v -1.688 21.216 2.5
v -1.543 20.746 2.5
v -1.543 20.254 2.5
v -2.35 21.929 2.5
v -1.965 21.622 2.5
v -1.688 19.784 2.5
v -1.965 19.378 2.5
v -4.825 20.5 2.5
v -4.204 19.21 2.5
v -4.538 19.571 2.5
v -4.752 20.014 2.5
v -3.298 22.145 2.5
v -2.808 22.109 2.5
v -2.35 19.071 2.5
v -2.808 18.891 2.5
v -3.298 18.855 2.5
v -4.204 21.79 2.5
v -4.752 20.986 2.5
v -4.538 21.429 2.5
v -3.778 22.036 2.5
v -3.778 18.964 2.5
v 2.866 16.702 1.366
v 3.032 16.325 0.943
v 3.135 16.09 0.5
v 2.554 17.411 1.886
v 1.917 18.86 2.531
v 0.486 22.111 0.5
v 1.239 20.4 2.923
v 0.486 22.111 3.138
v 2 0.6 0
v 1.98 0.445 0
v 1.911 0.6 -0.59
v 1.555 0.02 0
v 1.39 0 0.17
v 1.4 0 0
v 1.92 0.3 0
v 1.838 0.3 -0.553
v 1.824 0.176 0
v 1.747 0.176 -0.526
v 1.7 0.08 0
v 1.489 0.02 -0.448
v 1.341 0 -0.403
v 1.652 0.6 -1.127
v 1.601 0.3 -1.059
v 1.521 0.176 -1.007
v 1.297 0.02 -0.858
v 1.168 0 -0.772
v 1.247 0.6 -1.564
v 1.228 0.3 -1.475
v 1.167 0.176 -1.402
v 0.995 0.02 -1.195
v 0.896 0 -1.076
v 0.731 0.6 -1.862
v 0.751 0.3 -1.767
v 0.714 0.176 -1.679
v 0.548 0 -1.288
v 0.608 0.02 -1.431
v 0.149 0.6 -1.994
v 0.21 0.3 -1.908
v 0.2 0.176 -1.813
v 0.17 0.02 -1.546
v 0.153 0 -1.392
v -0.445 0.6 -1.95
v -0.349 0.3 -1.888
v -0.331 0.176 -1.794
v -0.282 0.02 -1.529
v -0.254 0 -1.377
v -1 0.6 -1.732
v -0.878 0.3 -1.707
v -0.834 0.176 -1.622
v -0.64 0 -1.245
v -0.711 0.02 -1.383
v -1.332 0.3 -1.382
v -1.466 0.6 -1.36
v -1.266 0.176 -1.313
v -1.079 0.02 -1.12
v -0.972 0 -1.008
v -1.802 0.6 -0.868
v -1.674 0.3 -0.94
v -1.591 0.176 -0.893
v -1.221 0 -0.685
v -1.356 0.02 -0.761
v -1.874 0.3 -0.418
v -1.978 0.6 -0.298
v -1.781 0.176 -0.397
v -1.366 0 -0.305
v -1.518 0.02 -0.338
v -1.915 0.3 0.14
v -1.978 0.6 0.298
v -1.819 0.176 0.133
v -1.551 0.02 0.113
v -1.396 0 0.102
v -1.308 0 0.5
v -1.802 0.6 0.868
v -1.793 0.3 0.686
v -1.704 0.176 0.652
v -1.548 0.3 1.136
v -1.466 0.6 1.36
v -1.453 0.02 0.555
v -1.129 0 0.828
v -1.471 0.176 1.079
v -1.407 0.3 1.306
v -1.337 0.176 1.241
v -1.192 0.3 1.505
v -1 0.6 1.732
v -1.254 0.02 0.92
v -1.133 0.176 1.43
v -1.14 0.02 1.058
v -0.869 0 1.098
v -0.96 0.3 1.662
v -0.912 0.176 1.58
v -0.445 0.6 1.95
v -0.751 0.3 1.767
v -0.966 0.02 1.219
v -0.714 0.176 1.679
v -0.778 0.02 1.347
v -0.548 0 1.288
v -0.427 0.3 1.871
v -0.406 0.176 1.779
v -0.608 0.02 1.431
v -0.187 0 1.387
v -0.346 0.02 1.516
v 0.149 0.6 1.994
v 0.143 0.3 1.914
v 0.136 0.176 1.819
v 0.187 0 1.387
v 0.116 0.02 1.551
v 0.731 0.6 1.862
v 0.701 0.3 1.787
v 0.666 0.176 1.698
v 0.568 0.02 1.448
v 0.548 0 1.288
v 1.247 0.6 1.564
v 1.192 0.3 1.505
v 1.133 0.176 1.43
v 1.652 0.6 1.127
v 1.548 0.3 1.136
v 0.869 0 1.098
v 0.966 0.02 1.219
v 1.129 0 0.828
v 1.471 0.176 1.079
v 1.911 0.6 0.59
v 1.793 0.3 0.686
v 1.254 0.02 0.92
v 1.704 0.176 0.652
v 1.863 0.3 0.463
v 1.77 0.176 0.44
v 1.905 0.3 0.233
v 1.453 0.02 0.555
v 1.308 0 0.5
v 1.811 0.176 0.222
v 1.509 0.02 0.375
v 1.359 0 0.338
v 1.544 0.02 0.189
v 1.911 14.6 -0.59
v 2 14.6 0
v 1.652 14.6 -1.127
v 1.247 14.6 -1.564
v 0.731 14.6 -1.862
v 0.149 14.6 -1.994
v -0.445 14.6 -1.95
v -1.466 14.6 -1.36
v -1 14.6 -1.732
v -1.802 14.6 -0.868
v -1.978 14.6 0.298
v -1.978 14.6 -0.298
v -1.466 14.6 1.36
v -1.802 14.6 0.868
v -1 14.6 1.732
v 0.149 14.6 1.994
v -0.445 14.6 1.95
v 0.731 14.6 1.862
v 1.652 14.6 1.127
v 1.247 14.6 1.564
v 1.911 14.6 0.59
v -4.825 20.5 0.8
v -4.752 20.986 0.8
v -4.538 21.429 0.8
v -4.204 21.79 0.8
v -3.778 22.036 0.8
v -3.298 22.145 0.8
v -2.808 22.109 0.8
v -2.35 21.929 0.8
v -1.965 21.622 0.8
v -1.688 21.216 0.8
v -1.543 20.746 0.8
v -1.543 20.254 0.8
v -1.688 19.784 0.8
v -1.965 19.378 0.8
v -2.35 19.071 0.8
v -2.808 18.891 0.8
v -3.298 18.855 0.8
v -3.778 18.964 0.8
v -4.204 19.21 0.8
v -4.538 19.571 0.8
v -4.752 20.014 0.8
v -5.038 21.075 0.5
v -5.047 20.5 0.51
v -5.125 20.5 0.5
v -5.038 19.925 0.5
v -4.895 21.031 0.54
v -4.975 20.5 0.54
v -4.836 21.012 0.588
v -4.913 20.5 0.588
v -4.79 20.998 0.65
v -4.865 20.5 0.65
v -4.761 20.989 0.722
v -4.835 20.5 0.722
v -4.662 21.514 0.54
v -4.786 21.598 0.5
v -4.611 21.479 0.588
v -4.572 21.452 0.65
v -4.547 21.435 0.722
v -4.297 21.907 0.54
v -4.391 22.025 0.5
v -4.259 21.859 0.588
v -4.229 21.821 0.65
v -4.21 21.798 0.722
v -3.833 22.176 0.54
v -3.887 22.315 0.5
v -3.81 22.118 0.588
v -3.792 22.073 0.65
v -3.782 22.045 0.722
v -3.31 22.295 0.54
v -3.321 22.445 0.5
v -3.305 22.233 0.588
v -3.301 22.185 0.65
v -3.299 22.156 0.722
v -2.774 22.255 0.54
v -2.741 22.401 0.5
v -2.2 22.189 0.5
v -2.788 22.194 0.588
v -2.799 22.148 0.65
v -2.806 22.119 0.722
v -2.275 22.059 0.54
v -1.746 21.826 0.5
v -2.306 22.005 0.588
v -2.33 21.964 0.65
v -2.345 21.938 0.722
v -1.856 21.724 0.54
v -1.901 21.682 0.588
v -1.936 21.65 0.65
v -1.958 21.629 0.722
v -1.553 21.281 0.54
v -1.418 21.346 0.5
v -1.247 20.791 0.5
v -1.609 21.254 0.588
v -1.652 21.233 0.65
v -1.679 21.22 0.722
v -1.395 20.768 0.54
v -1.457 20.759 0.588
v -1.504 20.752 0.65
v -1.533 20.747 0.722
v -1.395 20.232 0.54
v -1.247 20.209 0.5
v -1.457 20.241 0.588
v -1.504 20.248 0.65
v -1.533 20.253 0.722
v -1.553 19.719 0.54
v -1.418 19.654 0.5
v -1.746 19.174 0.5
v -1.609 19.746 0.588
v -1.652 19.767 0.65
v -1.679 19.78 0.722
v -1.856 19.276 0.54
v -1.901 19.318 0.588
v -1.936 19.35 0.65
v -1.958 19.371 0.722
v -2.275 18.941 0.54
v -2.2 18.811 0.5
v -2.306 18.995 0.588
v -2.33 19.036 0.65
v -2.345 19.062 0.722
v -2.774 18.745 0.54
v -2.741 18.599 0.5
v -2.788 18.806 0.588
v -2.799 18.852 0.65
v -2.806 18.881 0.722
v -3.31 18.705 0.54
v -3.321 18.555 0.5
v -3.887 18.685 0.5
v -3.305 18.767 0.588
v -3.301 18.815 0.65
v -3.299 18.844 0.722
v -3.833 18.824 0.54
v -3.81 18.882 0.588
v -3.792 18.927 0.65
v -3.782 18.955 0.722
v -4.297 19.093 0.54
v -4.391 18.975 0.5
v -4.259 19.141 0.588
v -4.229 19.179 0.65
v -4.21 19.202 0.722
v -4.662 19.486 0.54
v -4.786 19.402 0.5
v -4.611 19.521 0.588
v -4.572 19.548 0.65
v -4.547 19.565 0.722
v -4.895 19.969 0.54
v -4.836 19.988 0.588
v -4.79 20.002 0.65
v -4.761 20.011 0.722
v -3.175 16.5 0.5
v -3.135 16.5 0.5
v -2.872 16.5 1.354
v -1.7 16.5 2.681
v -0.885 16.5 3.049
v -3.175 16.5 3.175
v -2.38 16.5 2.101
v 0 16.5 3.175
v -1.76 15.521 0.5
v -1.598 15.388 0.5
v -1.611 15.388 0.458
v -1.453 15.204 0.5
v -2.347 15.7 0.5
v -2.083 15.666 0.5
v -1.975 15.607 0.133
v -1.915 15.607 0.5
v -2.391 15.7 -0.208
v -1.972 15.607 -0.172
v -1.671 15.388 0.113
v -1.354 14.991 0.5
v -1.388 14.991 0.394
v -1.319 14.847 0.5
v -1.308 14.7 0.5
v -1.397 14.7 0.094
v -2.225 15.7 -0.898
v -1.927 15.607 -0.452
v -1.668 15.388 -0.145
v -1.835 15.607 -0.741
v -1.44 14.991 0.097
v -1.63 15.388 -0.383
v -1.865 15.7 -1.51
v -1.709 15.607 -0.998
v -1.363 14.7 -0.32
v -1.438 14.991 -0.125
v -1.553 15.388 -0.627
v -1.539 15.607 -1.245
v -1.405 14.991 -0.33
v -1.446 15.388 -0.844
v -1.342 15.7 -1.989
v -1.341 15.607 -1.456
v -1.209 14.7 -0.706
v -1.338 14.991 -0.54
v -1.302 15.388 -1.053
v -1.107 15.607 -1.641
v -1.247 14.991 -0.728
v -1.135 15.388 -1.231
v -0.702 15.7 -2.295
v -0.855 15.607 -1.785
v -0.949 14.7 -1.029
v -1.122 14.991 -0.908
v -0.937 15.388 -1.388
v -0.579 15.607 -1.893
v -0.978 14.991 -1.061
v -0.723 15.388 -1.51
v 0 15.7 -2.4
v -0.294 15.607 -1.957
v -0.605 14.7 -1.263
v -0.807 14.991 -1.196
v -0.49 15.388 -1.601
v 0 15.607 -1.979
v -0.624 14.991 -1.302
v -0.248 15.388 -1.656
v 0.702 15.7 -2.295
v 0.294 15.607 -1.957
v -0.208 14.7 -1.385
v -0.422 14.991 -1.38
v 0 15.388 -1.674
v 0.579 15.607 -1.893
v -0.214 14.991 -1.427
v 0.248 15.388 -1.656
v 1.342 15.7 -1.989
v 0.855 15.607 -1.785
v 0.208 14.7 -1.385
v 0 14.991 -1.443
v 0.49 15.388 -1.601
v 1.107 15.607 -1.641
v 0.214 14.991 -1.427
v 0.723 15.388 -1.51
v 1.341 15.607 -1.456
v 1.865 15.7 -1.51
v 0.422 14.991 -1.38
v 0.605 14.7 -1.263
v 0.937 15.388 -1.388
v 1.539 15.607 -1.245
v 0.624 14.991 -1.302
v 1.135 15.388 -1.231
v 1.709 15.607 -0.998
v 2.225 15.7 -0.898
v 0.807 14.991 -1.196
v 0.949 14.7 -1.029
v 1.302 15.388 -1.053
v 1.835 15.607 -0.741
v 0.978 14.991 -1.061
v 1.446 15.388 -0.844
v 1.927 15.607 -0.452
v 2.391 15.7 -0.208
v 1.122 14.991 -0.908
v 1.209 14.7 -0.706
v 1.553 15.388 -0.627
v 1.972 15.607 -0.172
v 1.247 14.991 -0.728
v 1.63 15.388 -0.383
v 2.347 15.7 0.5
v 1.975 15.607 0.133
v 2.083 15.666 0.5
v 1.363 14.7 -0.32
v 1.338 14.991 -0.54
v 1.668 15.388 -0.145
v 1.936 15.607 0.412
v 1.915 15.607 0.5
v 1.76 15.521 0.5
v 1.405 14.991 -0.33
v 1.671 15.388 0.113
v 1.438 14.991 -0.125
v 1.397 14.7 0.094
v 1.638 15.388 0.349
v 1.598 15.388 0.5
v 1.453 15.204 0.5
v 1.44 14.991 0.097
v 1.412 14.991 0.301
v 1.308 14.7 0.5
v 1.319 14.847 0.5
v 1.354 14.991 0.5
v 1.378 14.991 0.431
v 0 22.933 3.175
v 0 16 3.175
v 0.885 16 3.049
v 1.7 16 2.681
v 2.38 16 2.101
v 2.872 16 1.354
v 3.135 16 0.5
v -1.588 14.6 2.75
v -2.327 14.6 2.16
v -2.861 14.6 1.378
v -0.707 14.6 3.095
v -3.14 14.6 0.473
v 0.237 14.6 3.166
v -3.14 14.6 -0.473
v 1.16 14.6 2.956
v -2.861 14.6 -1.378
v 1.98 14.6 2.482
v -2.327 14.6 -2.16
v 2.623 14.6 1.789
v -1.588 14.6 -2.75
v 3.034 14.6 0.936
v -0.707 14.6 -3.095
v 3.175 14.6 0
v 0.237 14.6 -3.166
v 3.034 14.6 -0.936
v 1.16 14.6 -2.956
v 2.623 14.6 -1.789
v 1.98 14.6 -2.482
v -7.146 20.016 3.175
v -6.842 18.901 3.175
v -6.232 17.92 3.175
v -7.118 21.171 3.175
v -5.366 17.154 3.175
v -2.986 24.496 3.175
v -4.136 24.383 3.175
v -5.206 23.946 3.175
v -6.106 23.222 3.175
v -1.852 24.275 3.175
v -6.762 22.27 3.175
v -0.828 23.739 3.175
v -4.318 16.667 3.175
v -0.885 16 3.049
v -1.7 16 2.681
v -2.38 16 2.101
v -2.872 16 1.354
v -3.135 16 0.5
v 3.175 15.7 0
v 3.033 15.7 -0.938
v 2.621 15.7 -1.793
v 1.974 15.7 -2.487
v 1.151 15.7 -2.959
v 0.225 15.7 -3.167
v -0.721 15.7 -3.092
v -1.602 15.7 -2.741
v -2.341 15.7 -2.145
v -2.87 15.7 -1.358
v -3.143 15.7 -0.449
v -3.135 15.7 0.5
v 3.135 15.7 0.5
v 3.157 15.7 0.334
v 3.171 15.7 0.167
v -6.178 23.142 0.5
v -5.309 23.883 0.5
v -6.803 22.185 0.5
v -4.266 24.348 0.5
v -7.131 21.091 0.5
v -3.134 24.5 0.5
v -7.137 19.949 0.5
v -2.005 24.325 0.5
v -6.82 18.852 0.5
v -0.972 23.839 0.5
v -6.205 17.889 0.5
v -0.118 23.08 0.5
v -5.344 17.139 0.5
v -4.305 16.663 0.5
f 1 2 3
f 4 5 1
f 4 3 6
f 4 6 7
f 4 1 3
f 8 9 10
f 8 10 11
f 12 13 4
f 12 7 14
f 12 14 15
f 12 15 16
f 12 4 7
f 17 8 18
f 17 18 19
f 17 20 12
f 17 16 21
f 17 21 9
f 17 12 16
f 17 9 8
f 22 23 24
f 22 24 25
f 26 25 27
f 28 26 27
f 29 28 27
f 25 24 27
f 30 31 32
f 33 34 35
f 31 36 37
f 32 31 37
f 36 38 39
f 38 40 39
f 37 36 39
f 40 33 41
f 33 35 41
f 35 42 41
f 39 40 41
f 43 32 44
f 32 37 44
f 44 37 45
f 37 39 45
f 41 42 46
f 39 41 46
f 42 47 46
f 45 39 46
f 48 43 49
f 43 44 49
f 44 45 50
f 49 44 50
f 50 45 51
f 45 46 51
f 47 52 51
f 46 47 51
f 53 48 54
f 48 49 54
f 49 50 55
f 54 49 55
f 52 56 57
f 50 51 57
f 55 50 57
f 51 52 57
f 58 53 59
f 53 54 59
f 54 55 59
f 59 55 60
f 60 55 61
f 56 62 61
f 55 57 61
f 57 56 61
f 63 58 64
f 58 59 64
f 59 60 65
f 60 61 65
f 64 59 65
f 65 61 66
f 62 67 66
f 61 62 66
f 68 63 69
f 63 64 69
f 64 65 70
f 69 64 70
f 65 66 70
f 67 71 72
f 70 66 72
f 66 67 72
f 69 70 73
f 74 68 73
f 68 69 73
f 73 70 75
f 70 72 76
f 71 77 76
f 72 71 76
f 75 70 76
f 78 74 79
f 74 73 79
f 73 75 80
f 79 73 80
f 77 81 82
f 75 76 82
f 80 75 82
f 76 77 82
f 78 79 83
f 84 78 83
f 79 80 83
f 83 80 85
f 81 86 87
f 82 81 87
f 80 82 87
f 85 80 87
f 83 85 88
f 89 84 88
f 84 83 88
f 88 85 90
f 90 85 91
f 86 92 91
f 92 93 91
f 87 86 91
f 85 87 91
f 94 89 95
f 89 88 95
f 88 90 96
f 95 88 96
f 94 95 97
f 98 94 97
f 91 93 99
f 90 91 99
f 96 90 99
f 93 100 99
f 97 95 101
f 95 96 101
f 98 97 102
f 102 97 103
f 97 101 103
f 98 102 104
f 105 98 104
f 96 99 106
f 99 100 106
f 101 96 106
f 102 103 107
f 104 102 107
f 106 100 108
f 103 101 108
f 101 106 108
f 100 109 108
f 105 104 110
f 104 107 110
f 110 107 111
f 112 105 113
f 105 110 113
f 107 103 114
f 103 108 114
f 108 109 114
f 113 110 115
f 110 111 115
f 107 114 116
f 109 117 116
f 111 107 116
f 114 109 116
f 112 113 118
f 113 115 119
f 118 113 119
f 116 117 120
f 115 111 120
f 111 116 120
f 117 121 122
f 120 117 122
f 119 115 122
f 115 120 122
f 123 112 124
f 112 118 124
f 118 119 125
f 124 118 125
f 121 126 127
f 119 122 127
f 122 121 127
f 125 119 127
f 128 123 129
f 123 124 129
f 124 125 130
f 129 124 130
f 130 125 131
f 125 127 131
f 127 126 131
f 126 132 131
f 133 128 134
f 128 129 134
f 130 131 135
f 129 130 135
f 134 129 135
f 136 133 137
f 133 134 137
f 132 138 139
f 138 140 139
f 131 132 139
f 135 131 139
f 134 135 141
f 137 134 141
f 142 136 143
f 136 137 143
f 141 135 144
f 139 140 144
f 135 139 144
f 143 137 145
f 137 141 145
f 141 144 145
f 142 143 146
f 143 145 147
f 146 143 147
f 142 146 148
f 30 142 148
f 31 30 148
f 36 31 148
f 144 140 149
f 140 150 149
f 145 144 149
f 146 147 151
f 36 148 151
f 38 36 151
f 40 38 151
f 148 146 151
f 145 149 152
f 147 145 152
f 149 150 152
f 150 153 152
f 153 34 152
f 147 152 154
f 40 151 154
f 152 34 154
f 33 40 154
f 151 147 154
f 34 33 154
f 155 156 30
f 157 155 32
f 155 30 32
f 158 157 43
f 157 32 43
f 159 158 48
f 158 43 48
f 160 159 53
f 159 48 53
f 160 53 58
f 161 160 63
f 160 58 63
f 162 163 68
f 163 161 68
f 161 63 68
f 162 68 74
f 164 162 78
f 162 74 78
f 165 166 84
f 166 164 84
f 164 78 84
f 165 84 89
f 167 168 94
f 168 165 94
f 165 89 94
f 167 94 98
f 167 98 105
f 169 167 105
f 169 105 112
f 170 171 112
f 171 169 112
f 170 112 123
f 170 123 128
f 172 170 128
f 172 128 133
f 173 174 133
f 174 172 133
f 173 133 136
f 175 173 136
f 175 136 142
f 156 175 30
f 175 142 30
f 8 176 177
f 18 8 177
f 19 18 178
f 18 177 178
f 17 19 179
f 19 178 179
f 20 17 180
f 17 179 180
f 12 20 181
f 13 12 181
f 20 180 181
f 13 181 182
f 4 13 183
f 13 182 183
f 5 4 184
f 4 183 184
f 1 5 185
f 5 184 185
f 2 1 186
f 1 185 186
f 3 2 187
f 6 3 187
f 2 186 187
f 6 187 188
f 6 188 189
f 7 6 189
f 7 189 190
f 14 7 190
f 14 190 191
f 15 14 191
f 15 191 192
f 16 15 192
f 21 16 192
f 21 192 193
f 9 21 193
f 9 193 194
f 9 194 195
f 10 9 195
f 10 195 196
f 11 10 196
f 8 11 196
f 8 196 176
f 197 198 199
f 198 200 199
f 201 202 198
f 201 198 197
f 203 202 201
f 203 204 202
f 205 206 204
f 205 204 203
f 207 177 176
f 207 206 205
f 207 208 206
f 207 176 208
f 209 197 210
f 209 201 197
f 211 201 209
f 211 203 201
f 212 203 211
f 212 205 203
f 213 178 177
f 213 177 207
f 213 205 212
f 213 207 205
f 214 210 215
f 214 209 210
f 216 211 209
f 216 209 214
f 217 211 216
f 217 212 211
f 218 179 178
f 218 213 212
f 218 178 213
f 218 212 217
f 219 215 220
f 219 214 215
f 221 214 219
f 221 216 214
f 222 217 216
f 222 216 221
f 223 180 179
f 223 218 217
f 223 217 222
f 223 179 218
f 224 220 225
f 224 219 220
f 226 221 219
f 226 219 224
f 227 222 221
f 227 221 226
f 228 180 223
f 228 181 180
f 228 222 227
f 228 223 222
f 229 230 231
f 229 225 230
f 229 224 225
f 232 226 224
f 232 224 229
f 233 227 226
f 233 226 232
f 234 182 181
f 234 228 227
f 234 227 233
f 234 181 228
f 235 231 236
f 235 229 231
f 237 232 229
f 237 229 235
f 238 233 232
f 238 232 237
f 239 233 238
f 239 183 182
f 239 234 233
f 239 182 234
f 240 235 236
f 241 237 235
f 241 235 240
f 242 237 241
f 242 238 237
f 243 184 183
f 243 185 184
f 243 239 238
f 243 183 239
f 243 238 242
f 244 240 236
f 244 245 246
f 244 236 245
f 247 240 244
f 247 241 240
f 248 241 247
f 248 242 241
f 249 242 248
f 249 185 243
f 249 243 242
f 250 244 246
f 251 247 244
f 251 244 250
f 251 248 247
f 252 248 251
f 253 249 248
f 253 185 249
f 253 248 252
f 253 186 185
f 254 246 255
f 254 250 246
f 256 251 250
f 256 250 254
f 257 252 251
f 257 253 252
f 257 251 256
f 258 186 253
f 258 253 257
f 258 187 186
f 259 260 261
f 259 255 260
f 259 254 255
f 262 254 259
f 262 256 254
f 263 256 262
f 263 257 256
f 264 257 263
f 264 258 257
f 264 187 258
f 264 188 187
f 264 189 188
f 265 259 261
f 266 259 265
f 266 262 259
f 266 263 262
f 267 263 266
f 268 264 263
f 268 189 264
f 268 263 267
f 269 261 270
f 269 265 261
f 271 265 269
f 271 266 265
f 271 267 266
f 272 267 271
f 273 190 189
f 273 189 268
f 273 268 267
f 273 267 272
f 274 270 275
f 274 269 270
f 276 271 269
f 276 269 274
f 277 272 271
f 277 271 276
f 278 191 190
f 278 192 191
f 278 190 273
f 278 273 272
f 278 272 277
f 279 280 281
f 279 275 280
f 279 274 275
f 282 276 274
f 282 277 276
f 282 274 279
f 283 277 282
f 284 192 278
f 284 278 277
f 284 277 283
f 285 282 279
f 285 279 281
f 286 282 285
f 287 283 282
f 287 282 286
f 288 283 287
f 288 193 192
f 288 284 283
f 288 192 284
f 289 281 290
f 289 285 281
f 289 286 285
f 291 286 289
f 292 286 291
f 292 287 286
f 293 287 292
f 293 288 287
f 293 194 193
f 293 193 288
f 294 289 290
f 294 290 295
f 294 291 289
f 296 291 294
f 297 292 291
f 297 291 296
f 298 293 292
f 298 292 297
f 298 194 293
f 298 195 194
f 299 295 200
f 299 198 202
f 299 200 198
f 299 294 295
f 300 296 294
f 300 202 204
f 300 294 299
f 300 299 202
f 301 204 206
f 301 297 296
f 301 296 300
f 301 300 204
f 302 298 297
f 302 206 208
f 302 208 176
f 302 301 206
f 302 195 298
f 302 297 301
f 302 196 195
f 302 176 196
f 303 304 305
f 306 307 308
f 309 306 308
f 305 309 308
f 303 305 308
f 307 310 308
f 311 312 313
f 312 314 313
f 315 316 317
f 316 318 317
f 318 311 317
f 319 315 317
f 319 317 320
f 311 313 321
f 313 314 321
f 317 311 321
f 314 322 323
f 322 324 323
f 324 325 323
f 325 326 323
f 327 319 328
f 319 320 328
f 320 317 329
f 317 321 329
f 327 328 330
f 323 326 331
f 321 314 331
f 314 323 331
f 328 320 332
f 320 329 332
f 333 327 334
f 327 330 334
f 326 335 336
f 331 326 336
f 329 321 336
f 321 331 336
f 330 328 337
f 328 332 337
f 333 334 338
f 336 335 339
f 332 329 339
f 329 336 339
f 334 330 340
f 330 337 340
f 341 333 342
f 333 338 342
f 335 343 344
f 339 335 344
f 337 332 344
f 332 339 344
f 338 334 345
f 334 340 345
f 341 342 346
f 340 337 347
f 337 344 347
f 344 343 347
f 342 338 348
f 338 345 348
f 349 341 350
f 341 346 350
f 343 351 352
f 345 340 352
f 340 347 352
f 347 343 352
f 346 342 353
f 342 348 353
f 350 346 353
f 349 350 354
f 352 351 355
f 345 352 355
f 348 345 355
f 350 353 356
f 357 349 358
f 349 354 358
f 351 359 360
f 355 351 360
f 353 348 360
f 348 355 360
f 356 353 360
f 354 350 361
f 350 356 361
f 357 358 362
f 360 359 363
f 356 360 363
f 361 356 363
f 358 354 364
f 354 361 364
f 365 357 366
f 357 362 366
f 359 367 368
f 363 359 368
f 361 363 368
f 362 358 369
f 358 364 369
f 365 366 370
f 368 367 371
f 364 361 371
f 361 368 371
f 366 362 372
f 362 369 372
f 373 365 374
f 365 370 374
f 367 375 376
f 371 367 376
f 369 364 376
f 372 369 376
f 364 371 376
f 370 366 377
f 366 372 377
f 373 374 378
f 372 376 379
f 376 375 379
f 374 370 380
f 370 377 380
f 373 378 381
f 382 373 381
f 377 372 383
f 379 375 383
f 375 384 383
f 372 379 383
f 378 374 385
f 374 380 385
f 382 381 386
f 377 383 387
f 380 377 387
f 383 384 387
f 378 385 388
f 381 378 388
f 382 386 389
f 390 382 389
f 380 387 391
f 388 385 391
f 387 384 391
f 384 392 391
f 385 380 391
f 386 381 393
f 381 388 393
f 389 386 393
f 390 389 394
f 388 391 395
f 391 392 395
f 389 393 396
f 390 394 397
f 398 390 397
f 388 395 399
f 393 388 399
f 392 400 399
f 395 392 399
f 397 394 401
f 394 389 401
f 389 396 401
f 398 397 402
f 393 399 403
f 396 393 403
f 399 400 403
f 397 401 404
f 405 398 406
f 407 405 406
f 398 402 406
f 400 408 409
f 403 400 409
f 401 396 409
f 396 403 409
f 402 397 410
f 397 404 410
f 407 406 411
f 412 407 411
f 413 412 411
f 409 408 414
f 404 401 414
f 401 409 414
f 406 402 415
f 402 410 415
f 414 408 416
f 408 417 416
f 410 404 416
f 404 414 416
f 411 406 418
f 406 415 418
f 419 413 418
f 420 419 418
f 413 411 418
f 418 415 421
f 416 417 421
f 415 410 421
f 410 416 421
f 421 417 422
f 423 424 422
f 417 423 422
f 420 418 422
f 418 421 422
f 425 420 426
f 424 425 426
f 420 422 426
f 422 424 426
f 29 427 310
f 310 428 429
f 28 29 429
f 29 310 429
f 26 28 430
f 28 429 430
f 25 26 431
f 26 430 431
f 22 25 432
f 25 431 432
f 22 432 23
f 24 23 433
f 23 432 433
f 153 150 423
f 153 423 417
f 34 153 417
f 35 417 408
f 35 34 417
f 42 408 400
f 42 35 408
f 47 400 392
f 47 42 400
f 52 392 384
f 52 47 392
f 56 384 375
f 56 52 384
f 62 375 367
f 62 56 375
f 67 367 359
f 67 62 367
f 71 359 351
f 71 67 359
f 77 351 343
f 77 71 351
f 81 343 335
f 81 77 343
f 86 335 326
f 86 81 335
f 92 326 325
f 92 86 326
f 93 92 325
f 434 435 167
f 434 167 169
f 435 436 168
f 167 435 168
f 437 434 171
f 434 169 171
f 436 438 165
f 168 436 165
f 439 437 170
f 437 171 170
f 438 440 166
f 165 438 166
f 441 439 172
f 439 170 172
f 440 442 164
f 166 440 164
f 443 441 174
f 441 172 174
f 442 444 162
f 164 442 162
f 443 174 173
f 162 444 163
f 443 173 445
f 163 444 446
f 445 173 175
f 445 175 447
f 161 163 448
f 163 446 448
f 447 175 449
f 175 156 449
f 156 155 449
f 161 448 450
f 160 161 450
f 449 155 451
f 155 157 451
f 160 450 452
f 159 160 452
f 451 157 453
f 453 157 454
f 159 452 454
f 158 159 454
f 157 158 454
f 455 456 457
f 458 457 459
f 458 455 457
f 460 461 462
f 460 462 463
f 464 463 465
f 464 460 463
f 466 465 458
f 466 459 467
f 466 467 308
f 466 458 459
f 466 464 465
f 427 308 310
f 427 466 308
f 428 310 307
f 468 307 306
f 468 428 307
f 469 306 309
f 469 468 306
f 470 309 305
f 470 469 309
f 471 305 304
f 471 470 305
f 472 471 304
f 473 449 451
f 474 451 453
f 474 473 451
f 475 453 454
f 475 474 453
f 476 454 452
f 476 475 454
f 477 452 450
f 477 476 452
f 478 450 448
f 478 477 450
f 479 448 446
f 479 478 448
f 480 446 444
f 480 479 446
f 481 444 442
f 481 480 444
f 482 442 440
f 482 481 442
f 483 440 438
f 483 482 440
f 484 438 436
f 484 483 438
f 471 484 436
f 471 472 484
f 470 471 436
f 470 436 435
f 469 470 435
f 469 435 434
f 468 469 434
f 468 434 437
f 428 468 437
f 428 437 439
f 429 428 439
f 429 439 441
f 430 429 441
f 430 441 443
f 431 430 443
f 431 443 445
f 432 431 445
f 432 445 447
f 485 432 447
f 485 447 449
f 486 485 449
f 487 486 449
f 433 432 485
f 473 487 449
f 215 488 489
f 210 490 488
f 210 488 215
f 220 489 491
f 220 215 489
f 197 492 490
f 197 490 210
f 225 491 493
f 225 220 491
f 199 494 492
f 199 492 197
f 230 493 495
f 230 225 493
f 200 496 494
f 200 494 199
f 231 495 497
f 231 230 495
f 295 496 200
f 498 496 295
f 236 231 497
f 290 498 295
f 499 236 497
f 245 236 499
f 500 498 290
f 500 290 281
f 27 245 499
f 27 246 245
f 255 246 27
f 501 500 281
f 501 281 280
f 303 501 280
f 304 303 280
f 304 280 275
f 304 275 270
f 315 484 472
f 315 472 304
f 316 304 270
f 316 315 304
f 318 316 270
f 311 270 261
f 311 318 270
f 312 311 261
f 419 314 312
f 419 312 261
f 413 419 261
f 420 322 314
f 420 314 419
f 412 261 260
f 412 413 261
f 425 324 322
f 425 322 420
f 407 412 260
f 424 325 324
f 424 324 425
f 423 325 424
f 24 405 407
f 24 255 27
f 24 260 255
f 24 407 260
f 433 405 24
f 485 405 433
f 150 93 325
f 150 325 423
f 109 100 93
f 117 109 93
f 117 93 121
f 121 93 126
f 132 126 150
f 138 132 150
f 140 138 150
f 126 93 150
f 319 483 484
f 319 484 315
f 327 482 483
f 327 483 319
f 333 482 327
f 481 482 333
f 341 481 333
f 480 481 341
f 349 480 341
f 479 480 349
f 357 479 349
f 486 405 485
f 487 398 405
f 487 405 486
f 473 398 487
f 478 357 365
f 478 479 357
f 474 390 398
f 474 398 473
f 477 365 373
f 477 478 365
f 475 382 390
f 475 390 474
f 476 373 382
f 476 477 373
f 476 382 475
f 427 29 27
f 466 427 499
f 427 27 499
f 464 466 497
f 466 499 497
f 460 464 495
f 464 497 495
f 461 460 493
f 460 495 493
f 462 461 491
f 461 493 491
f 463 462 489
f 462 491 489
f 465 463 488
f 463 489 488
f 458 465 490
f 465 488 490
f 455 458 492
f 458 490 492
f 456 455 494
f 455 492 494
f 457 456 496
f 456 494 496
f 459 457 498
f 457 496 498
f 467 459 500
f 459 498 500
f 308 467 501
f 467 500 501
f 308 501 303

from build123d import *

# Parameters (mm, degrees)
SKETCH_1_R               = 2
EXTRUDE_1_DEPTH          = 16
EXTRUDE_2_DEPTH          = 3.175
SKETCH_4_R               = 1.65
CUT_EXTRUDE_6_DEPTH      = 2.5
SKETCH_5_W               = 10.65
SKETCH_5_H               = 0.5
CUT_EXTRUDE_8_DEPTH      = 9.5
FILLET_3_R               = 0.6
SKETCH_7_R               = 3.175
EXTRUDE_3_DEPTH          = 1.4
FILLET_5_R               = 0.3
CUT_EXTRUDE_9_DEPTH      = 1
CUT_EXTRUDE_9_DEPTH_BACK = 25.5
CUT_EXTRUDE_10_DEPTH     = 9.5
CUT_EXTRUDE_11_DEPTH     = 0.3
FILLET_6_R               = 1
CUT_EXTRUDE_12_DEPTH     = 0.5


with BuildPart() as part:
    # 草图1 → 凸台-拉伸1 (new body)
    with BuildSketch(Plane(origin=(0, 0, 0), x_dir=(1, 0, 0), z_dir=(0, 1, 0))):
        Circle(SKETCH_1_R)
    extrude(amount=EXTRUDE_1_DEPTH)

    # 草图2 → 凸台-拉伸2 (add)
    with BuildSketch(Plane.XY):
        with BuildLine():
            Line((3.175, 16), (0.486277818, 22.110914255))
            ThreePointArc((0.486277818, 22.110914255), (-6.524899776, 22.6859029), (-3.175, 16.5))
            Line((-3.175, 16.5), (-3.175, 16))
            Line((-3.175, 16), (3.175, 16))
        make_face()
    extrude(amount=EXTRUDE_2_DEPTH)

    # 草图4 → 切除-拉伸6 (cut)
    with BuildSketch(Plane(origin=(0, 0, 0), x_dir=(-1, 0, 0), z_dir=(0, 0, -1))):
        with Locations((3.175, 20.5)):
            Circle(SKETCH_4_R)
    extrude(amount=-CUT_EXTRUDE_6_DEPTH, mode=Mode.SUBTRACT)

    # 草图5 → 切除-拉伸8 (cut, through all)
    with BuildSketch(Plane(origin=(0, 16, 0), x_dir=(1, 0, 0), z_dir=(0, 1, 0))):
        with Locations((-2.15, -0.25)):
            Rectangle(SKETCH_5_W, SKETCH_5_H)
    extrude(amount=CUT_EXTRUDE_8_DEPTH, mode=Mode.SUBTRACT)

    # 圆角3
    fillet_3_edges = [part.edges().sort_by_distance(p)[0] for p in [
        (-2, 0, 0),
    ]]
    fillet(fillet_3_edges, radius=FILLET_3_R)

    # 草图7 → 凸台-拉伸3 (add)
    with BuildSketch(Plane(origin=(0, 16, 0), x_dir=(1, 0, 0), z_dir=(0, 1, 0))):
        Circle(SKETCH_7_R)
    extrude(amount=-EXTRUDE_3_DEPTH)

    # 圆角5
    fillet_5_edges = [part.edges().sort_by_distance(p)[0] for p in [
        (-1.525, 20.5, 0.5),
    ]]
    fillet(fillet_5_edges, radius=FILLET_5_R)

    # 草图10 → 切除-拉伸9 (cut, two sides)
    with BuildSketch(Plane.XZ) as cut_extrude_9_sk:
        with BuildLine():
            Line((-1.307669683, 0.5), (1.307669683, 0.5))
            ThreePointArc((1.307669683, 0.5), (0, -1.4), (-1.307669683, 0.5))
        make_face()
    extrude(amount=CUT_EXTRUDE_9_DEPTH, mode=Mode.SUBTRACT)
    extrude(cut_extrude_9_sk.sketch, amount=-CUT_EXTRUDE_9_DEPTH_BACK, mode=Mode.SUBTRACT)

    # 草图11 → 切除-拉伸10 (cut, through all)
    with BuildSketch(Plane.XZ.offset(-16)):
        with BuildLine():
            Line((3.175, 3.175), (0, 3.175))
            ThreePointArc((0, 3.175), (2.060718928, 2.415380405), (3.135382752, 0.5))
            Line((3.135382752, 0.5), (4.008589629, 0.5))
            Line((4.008589629, 0.5), (3.175, 3.175))
        make_face()
    extrude(amount=-CUT_EXTRUDE_10_DEPTH, mode=Mode.SUBTRACT)

    # 草图12 → 切除-拉伸11 (cut)
    with BuildSketch(Plane(origin=(0, 16, 0), x_dir=(1, 0, 0), z_dir=(0, 1, 0))):
        with BuildLine():
            Line((-3.135382752, -0.5), (3.135382752, -0.5))
            ThreePointArc((3.135382752, -0.5), (0, 3.175), (-3.135382752, -0.5))
        make_face()
    extrude(amount=-CUT_EXTRUDE_11_DEPTH, mode=Mode.SUBTRACT)

    # 圆角6
    fillet_6_edges = [part.edges().sort_by_distance(p)[0] for p in [
        (0, 15.7, -1.4),
    ]]
    fillet(fillet_6_edges, radius=FILLET_6_R)

    # 草图13 → 切除-拉伸12 (cut)
    with BuildSketch(Plane.XZ.offset(-16)):
        with BuildLine():
            Line((-3.135382752, 0.5), (-3.175, 0.5))
            Line((-3.175, 0.5), (-3.175, 3.175))
            Line((-3.175, 3.175), (0, 3.175))
            ThreePointArc((0, 3.175), (-2.060718928, 2.415380405), (-3.135382752, 0.5))
        make_face()
    extrude(amount=-CUT_EXTRUDE_12_DEPTH, mode=Mode.SUBTRACT)


solid = part.part
